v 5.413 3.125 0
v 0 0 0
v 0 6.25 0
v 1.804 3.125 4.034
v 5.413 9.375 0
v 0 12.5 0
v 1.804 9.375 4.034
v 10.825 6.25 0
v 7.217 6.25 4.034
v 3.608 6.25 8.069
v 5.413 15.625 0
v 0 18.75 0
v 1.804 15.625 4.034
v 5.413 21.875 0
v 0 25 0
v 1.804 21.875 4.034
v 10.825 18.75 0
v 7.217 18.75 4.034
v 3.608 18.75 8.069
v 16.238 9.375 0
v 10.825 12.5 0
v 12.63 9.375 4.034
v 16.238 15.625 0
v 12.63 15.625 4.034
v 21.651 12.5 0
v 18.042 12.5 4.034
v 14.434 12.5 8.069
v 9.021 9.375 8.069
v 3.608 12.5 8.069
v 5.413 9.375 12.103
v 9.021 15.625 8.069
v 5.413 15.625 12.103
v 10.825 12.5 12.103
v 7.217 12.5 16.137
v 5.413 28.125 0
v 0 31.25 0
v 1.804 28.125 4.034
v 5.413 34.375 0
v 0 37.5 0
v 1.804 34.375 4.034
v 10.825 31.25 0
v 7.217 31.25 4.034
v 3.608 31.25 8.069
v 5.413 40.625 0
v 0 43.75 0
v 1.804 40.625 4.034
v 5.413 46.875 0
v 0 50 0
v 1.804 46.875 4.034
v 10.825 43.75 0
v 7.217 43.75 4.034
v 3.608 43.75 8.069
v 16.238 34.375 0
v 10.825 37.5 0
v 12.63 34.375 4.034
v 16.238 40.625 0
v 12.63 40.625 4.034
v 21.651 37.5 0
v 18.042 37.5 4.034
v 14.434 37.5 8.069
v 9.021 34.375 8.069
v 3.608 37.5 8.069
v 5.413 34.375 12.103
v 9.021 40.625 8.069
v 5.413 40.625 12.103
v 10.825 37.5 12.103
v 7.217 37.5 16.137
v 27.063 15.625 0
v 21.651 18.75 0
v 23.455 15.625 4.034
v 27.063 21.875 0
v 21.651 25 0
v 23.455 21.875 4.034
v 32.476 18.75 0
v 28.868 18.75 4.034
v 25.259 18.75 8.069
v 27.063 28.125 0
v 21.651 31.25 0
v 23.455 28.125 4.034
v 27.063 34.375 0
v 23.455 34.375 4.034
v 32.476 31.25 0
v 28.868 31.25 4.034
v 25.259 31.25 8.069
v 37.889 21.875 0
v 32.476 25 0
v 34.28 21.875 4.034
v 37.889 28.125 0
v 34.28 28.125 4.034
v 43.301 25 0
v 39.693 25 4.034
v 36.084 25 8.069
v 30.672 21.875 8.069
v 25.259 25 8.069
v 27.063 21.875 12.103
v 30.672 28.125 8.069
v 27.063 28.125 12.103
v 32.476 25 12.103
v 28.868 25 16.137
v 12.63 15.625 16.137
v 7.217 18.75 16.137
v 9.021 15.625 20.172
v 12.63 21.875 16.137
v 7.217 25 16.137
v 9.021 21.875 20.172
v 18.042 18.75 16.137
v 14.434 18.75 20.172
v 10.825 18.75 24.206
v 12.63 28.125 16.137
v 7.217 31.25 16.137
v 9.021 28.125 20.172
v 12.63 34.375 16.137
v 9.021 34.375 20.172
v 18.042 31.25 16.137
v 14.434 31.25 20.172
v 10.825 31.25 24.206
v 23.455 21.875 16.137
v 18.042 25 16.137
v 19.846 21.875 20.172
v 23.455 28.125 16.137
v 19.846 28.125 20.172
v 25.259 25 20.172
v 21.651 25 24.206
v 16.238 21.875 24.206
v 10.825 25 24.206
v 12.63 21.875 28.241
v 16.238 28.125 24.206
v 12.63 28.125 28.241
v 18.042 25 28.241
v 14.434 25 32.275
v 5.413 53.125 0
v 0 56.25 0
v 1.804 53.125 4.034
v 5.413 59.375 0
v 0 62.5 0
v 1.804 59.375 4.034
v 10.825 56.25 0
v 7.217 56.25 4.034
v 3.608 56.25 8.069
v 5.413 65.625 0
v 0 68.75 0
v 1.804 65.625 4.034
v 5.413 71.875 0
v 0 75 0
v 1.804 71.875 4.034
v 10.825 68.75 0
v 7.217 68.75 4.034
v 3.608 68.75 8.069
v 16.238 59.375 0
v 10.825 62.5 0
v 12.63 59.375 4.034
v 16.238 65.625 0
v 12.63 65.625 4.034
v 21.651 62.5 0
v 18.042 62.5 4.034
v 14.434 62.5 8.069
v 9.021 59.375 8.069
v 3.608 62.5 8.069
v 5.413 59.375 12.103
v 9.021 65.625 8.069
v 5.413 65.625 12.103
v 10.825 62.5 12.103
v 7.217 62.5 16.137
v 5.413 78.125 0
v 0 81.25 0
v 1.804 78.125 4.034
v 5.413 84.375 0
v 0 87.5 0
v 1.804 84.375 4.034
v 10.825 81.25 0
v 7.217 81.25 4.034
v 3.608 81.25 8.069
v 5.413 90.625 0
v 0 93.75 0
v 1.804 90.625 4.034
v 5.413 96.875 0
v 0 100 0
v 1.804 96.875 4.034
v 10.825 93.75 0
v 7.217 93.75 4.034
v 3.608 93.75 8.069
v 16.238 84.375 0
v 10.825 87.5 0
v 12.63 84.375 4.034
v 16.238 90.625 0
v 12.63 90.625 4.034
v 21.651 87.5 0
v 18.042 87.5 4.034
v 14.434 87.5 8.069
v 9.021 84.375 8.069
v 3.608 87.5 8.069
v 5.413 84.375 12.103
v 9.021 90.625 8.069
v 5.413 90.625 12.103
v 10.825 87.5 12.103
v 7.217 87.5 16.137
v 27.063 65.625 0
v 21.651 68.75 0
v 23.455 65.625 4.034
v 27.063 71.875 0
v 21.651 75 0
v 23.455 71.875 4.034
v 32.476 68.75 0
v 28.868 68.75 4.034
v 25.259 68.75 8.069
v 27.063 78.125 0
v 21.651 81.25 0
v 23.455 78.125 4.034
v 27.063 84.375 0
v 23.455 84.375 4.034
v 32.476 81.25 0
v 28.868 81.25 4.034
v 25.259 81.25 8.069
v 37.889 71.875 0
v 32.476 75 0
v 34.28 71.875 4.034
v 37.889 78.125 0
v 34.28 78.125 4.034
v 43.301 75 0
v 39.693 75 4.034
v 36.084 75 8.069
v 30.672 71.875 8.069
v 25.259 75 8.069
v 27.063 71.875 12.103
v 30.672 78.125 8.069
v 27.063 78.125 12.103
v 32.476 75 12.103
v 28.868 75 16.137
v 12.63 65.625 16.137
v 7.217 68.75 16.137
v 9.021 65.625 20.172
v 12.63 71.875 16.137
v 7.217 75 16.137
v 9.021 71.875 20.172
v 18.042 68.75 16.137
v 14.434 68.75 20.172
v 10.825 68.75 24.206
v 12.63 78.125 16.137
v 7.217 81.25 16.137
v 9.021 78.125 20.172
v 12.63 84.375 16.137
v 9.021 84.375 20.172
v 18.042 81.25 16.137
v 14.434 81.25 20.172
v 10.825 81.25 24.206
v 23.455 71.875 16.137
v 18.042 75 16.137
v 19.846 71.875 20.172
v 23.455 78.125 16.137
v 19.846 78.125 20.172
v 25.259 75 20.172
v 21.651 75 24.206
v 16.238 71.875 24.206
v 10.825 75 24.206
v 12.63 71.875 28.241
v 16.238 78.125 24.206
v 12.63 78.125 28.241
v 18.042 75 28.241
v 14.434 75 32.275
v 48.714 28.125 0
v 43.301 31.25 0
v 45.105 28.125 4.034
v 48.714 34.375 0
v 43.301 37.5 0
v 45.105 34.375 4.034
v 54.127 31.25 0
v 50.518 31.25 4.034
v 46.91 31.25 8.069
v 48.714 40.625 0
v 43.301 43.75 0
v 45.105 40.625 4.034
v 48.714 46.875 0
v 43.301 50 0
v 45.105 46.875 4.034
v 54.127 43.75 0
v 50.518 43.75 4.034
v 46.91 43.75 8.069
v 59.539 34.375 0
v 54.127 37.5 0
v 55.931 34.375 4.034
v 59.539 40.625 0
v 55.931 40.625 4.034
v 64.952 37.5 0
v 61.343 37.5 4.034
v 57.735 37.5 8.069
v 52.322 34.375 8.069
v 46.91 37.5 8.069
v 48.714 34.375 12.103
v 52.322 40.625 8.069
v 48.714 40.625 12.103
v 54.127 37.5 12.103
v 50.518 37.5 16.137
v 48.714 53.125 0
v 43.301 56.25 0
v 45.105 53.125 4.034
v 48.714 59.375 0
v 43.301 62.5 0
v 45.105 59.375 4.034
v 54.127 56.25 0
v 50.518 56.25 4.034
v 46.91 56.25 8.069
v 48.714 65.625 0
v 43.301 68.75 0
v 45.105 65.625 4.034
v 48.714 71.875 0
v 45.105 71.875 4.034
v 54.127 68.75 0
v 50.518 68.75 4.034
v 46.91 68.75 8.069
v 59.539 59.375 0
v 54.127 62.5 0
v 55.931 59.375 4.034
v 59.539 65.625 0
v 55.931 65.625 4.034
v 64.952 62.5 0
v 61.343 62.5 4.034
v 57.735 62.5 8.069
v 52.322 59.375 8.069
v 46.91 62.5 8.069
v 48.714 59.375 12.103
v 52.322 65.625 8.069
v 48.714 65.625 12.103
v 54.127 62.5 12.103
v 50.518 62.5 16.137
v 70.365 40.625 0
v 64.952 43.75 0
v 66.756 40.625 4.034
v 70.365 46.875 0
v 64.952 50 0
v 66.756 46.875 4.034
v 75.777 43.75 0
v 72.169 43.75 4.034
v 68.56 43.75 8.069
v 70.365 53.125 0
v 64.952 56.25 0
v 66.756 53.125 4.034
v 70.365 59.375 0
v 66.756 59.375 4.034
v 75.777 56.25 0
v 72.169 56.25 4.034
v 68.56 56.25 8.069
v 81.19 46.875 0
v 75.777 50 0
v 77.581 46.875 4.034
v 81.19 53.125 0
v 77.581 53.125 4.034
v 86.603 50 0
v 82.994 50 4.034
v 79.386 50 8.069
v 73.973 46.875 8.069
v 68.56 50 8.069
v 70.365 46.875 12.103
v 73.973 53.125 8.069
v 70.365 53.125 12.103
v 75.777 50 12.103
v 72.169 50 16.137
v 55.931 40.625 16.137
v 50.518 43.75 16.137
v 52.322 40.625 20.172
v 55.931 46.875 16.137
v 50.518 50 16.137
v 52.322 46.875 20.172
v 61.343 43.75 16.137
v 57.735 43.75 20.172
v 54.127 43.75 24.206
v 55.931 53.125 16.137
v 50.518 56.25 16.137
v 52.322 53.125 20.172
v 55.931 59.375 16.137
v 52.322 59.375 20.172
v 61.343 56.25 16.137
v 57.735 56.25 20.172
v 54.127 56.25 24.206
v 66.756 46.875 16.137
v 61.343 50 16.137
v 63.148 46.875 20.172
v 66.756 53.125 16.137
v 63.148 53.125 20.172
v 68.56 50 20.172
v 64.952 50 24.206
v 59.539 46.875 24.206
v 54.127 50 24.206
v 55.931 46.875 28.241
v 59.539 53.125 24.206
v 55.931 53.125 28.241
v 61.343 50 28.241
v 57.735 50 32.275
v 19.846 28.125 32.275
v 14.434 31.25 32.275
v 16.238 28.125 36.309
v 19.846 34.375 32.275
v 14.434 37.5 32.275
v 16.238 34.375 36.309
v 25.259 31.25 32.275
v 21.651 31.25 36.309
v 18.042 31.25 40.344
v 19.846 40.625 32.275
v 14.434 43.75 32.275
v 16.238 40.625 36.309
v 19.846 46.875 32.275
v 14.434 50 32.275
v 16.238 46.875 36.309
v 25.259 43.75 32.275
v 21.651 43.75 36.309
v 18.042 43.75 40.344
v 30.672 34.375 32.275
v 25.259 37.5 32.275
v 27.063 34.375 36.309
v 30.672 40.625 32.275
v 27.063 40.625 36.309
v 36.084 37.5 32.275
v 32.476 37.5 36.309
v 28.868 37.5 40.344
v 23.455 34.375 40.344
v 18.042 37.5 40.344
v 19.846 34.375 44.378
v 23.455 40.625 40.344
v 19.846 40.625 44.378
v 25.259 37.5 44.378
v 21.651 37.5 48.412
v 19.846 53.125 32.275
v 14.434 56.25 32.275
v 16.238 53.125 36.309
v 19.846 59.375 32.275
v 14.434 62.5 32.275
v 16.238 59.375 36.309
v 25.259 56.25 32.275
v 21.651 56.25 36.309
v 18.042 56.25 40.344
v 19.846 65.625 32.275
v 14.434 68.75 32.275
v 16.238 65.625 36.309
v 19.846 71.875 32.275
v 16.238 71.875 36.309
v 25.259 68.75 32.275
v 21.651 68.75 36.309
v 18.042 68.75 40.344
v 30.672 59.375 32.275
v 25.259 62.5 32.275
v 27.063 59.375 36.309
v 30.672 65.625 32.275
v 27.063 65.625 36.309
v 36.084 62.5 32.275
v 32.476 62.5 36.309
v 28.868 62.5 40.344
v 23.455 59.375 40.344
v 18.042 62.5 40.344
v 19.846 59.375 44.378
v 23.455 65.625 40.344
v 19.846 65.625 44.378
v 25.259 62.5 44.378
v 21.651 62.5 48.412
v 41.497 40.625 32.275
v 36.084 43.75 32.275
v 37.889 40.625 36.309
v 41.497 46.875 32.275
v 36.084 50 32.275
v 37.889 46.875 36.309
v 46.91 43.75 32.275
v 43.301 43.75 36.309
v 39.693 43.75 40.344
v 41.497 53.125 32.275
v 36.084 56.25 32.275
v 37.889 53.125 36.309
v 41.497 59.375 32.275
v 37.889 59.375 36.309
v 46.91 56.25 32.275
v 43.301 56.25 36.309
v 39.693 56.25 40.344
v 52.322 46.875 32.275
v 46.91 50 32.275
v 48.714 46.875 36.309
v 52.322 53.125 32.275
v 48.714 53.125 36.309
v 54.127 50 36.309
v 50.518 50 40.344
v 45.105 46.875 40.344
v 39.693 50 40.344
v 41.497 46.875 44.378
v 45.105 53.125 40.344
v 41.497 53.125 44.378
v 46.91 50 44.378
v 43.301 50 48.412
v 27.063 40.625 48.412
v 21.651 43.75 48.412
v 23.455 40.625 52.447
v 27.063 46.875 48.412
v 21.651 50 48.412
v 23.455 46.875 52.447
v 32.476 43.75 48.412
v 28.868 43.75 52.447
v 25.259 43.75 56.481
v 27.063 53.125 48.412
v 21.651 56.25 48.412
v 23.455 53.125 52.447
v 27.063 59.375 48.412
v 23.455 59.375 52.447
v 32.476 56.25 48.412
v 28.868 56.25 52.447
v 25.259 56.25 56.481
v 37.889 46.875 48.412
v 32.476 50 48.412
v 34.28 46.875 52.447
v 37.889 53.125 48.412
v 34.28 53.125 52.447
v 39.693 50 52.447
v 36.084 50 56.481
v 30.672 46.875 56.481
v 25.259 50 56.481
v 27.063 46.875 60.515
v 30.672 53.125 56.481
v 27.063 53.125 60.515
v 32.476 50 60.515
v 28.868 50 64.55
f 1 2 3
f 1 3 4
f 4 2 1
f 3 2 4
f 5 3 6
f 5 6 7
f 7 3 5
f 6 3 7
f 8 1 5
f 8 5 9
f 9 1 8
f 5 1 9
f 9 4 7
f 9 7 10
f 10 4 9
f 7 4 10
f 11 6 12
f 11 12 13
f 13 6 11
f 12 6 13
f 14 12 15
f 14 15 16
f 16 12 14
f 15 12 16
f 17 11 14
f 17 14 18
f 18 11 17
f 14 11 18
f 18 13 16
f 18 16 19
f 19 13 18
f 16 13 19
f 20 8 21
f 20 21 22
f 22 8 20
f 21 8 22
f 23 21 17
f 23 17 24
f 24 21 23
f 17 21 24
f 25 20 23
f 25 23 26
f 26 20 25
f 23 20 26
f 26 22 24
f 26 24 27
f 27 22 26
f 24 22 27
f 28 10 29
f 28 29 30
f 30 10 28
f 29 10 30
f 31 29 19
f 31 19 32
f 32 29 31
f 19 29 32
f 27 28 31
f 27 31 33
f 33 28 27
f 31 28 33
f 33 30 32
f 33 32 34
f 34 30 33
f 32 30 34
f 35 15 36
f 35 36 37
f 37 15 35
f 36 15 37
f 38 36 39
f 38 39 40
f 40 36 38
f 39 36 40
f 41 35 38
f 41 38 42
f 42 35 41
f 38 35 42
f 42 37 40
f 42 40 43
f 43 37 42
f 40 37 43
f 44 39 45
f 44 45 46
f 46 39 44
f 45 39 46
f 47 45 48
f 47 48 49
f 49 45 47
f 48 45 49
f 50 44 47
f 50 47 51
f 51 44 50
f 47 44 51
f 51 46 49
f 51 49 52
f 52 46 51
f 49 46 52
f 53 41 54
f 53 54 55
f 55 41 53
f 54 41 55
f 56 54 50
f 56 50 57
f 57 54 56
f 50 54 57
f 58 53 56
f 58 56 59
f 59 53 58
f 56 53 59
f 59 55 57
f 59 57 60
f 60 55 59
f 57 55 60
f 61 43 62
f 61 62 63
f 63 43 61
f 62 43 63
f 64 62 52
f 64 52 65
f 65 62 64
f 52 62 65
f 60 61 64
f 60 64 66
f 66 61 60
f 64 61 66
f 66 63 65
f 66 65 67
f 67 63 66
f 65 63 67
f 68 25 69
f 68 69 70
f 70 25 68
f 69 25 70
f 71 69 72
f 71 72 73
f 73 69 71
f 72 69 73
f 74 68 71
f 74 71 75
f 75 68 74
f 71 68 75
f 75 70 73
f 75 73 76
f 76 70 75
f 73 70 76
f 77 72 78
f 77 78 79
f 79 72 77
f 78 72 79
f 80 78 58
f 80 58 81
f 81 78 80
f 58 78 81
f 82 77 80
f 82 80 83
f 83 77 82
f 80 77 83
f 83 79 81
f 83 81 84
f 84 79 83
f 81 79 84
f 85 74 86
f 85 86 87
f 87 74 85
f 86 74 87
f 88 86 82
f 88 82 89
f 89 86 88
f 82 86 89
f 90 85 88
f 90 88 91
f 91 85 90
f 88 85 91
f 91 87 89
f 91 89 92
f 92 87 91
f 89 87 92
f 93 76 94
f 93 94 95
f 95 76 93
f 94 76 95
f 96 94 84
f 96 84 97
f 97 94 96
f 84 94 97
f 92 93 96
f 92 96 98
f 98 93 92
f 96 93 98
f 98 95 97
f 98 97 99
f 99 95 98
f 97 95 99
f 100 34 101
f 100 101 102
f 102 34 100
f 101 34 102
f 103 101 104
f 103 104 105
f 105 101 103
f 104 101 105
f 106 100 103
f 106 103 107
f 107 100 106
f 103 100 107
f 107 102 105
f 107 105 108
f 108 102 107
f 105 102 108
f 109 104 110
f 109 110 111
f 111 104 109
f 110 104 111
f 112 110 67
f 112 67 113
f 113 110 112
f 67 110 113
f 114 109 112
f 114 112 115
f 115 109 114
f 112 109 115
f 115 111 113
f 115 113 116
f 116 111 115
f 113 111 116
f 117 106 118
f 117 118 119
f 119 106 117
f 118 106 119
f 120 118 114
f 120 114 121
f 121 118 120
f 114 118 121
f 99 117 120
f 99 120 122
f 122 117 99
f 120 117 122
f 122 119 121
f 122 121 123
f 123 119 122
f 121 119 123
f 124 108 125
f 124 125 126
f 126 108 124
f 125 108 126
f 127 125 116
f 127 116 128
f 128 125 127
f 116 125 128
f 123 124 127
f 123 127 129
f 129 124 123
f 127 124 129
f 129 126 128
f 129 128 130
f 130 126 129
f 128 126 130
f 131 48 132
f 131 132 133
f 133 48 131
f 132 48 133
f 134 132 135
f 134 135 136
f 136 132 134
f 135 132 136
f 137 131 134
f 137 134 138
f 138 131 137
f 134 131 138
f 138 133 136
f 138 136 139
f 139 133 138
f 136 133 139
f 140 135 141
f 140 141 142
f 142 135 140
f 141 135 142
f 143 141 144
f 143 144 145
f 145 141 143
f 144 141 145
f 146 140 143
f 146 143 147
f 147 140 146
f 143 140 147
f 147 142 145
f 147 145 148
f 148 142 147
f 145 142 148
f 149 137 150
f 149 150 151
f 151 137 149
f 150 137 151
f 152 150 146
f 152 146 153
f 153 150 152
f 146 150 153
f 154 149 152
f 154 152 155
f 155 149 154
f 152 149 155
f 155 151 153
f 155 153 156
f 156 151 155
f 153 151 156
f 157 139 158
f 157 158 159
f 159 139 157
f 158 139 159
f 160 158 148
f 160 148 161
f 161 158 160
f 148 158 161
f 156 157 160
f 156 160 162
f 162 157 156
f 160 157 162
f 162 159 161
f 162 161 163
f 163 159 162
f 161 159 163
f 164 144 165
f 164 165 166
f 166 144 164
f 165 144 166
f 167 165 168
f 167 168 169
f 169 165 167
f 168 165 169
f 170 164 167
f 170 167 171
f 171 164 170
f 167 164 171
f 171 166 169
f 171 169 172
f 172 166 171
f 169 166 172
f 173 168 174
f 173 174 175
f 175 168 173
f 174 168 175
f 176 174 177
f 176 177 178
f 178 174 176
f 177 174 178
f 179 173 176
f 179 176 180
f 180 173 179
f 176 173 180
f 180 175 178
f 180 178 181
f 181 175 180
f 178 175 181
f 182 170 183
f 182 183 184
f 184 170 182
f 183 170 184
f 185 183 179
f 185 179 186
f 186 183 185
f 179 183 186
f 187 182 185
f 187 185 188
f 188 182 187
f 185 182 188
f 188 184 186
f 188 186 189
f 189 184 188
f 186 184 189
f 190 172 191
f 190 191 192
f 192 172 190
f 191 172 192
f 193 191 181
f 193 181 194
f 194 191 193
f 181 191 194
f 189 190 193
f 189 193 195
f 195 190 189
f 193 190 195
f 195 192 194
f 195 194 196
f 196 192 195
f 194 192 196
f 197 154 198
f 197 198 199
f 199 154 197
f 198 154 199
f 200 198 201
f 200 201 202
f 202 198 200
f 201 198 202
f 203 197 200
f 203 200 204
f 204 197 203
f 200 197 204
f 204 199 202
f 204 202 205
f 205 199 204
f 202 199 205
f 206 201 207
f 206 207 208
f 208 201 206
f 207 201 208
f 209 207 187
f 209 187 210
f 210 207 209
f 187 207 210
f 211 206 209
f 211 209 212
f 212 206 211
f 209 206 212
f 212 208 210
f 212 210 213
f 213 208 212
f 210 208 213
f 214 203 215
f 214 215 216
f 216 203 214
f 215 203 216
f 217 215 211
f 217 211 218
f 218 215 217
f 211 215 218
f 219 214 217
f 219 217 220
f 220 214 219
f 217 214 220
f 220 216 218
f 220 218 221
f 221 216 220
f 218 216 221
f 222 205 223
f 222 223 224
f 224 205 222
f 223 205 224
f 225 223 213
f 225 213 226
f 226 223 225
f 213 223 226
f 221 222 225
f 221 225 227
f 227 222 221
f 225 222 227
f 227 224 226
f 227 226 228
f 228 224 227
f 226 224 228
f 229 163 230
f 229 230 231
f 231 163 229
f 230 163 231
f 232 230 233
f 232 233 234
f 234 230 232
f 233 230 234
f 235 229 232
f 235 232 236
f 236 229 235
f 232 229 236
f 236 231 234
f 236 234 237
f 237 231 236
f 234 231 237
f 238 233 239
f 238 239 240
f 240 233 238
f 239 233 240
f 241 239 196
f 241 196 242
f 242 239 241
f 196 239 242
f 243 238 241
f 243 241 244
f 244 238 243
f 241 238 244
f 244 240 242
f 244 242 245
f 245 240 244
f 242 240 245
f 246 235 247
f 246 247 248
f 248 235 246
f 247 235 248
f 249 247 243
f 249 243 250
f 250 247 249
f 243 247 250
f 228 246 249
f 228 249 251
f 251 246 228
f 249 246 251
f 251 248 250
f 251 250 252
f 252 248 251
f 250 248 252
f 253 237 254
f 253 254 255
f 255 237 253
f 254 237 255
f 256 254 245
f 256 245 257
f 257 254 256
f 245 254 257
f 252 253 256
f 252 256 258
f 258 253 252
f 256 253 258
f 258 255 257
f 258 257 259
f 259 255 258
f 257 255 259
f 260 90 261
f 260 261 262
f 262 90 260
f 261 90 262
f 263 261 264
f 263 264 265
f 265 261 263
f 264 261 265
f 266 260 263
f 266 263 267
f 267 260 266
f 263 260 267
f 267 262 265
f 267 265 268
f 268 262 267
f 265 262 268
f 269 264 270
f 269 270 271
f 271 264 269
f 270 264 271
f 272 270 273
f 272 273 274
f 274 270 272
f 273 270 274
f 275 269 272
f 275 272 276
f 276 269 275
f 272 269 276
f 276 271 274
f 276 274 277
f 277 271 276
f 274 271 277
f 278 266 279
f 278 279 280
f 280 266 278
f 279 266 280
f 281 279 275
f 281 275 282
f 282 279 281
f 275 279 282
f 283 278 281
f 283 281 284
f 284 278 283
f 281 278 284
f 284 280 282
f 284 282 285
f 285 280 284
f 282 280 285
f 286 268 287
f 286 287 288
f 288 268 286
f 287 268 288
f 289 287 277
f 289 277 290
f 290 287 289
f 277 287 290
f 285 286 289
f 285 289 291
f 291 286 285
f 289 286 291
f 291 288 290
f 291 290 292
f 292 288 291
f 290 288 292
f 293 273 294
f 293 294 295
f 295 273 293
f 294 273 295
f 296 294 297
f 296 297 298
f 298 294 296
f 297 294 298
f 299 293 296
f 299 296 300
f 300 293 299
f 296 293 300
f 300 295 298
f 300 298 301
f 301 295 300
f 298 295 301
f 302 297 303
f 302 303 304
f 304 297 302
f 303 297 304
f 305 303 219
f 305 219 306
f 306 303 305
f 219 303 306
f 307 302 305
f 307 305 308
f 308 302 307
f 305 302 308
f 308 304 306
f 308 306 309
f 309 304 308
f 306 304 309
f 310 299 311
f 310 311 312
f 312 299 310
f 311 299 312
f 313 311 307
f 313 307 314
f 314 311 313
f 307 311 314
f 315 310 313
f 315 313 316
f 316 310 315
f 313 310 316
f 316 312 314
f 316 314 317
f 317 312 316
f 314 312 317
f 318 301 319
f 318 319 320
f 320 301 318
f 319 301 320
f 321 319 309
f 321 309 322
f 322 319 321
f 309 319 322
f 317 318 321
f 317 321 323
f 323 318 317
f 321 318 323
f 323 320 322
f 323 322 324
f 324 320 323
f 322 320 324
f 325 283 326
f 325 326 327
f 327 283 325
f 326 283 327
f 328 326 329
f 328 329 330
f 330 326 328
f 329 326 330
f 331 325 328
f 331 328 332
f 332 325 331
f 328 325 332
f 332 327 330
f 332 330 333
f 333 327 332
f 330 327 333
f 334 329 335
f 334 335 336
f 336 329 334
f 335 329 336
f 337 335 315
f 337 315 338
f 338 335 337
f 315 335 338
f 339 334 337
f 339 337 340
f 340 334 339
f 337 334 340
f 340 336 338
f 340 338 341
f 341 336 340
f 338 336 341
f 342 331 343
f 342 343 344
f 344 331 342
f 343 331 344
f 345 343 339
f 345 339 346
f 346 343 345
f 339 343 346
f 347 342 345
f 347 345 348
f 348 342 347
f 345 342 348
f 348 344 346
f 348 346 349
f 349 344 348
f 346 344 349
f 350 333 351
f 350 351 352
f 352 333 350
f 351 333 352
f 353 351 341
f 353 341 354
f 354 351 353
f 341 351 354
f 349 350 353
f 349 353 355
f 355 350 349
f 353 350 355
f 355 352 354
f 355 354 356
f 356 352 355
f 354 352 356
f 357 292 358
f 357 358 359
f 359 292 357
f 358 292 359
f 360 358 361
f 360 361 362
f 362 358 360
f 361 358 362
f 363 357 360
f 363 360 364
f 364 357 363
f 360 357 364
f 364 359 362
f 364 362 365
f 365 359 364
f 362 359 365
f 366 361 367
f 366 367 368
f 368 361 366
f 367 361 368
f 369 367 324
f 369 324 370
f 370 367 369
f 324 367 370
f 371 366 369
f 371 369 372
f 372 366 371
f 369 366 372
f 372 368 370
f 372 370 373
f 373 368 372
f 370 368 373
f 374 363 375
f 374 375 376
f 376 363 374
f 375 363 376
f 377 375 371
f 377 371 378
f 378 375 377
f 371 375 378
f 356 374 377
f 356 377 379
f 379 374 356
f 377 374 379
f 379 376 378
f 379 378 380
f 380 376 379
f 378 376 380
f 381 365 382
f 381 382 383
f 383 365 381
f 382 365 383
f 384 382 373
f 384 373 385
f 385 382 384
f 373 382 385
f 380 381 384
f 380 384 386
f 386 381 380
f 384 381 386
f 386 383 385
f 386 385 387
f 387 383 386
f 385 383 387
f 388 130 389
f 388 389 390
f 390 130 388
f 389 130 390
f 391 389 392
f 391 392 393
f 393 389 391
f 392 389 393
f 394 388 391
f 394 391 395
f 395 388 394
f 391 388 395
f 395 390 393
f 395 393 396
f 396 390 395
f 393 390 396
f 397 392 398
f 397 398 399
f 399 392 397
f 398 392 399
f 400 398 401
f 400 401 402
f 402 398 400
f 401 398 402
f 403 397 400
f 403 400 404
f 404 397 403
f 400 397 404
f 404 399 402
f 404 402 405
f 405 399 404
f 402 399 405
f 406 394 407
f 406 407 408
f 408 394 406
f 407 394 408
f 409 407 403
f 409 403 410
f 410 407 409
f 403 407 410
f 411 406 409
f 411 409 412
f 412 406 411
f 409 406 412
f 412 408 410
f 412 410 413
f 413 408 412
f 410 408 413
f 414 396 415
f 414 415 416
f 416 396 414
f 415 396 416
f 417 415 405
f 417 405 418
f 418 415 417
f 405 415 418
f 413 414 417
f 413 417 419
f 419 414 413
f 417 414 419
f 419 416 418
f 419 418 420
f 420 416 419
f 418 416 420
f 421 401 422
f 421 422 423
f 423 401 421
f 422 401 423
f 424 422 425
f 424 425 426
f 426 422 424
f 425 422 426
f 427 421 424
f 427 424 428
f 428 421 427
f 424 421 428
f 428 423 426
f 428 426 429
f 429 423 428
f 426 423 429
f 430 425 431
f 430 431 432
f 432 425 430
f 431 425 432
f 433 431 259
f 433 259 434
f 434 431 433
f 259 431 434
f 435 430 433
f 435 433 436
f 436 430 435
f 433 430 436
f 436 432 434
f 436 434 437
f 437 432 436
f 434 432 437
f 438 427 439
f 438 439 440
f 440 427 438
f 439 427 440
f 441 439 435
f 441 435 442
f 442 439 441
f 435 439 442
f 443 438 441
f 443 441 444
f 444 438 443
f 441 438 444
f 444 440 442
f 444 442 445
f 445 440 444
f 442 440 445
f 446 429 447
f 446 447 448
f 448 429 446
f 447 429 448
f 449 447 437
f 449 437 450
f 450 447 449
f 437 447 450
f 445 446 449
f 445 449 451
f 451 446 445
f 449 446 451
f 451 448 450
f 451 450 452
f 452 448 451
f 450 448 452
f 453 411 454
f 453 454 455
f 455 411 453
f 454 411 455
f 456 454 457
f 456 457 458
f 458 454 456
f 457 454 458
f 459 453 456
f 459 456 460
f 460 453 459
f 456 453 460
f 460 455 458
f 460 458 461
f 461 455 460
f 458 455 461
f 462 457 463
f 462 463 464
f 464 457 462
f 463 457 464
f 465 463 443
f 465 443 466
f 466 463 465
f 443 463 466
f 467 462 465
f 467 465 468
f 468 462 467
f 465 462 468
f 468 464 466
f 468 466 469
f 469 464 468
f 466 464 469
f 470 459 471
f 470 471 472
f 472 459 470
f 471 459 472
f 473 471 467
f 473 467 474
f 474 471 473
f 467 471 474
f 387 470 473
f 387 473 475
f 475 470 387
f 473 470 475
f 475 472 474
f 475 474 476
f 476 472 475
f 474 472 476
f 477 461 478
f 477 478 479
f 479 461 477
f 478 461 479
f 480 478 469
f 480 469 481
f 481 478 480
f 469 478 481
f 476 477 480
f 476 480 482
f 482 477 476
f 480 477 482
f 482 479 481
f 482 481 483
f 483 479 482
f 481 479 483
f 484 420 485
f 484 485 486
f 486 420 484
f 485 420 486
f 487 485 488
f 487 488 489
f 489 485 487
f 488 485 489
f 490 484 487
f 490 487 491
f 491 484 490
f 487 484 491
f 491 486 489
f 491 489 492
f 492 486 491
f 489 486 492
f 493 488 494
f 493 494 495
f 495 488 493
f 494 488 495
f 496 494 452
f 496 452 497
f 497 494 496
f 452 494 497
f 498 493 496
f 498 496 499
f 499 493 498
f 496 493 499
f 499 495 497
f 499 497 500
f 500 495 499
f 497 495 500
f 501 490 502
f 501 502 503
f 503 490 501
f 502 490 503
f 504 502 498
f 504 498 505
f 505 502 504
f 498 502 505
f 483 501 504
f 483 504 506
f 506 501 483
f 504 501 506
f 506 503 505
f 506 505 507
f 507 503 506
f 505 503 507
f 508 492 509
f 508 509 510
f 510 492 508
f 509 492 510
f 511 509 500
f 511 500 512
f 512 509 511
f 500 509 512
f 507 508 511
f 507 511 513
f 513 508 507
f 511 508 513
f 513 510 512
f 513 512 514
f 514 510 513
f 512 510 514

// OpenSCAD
origin = [0,0,0];
side = 100;

//setting printable to true makes the subpyramids overlap very slightly for a contiguous model; doesnt seem to actually enable a full render yet
printable = false;
//corner overlap sets the proportion of side length by which the tips will overlap for printability/contiguousness
corner_overlap = .05;

//choose levels of recursion
level = 4;


//create a tetrahedron of side length [side] with corner at [or]
module pyramid(or, side){
    s = side;
    v0 = or + [0,0,0];
    v1 = or + [0,s,0];
    v2 = or + [s * sqrt(3)/2,s/2,0];
    v3 = or + [s/(2*sqrt(3)), s/2, s * (sqrt(5)/sqrt(12))];

    polyhedron([v0, v1, v2, v3],[[0,2,1],[0,1,3],[0,3,2],[1,2,3]], convexity=10);
}


module sierpinski(level, s) {
    if (level == 0){
        pyramid(origin,s);
    }
    
    else{
        printScale = (printable) ? 1 + corner_overlap :1;
        overscale = [printScale,printScale,printScale];
        
        scale(overscale)sierpinski(level - 1, s/2);
        translate([0,(s/2),0])scale(overscale)sierpinski(level - 1, s/2);
        translate([(s*(sqrt(3)/4)),(s/4),0])scale(overscale)sierpinski(level - 1, s/2);
        translate([(s/(4*sqrt(3))),(s/4), (s * (sqrt(5)/(2*sqrt(12))))])scale(overscale)sierpinski(level - 1, s/2);
    }
}

union()sierpinski(level,side);
